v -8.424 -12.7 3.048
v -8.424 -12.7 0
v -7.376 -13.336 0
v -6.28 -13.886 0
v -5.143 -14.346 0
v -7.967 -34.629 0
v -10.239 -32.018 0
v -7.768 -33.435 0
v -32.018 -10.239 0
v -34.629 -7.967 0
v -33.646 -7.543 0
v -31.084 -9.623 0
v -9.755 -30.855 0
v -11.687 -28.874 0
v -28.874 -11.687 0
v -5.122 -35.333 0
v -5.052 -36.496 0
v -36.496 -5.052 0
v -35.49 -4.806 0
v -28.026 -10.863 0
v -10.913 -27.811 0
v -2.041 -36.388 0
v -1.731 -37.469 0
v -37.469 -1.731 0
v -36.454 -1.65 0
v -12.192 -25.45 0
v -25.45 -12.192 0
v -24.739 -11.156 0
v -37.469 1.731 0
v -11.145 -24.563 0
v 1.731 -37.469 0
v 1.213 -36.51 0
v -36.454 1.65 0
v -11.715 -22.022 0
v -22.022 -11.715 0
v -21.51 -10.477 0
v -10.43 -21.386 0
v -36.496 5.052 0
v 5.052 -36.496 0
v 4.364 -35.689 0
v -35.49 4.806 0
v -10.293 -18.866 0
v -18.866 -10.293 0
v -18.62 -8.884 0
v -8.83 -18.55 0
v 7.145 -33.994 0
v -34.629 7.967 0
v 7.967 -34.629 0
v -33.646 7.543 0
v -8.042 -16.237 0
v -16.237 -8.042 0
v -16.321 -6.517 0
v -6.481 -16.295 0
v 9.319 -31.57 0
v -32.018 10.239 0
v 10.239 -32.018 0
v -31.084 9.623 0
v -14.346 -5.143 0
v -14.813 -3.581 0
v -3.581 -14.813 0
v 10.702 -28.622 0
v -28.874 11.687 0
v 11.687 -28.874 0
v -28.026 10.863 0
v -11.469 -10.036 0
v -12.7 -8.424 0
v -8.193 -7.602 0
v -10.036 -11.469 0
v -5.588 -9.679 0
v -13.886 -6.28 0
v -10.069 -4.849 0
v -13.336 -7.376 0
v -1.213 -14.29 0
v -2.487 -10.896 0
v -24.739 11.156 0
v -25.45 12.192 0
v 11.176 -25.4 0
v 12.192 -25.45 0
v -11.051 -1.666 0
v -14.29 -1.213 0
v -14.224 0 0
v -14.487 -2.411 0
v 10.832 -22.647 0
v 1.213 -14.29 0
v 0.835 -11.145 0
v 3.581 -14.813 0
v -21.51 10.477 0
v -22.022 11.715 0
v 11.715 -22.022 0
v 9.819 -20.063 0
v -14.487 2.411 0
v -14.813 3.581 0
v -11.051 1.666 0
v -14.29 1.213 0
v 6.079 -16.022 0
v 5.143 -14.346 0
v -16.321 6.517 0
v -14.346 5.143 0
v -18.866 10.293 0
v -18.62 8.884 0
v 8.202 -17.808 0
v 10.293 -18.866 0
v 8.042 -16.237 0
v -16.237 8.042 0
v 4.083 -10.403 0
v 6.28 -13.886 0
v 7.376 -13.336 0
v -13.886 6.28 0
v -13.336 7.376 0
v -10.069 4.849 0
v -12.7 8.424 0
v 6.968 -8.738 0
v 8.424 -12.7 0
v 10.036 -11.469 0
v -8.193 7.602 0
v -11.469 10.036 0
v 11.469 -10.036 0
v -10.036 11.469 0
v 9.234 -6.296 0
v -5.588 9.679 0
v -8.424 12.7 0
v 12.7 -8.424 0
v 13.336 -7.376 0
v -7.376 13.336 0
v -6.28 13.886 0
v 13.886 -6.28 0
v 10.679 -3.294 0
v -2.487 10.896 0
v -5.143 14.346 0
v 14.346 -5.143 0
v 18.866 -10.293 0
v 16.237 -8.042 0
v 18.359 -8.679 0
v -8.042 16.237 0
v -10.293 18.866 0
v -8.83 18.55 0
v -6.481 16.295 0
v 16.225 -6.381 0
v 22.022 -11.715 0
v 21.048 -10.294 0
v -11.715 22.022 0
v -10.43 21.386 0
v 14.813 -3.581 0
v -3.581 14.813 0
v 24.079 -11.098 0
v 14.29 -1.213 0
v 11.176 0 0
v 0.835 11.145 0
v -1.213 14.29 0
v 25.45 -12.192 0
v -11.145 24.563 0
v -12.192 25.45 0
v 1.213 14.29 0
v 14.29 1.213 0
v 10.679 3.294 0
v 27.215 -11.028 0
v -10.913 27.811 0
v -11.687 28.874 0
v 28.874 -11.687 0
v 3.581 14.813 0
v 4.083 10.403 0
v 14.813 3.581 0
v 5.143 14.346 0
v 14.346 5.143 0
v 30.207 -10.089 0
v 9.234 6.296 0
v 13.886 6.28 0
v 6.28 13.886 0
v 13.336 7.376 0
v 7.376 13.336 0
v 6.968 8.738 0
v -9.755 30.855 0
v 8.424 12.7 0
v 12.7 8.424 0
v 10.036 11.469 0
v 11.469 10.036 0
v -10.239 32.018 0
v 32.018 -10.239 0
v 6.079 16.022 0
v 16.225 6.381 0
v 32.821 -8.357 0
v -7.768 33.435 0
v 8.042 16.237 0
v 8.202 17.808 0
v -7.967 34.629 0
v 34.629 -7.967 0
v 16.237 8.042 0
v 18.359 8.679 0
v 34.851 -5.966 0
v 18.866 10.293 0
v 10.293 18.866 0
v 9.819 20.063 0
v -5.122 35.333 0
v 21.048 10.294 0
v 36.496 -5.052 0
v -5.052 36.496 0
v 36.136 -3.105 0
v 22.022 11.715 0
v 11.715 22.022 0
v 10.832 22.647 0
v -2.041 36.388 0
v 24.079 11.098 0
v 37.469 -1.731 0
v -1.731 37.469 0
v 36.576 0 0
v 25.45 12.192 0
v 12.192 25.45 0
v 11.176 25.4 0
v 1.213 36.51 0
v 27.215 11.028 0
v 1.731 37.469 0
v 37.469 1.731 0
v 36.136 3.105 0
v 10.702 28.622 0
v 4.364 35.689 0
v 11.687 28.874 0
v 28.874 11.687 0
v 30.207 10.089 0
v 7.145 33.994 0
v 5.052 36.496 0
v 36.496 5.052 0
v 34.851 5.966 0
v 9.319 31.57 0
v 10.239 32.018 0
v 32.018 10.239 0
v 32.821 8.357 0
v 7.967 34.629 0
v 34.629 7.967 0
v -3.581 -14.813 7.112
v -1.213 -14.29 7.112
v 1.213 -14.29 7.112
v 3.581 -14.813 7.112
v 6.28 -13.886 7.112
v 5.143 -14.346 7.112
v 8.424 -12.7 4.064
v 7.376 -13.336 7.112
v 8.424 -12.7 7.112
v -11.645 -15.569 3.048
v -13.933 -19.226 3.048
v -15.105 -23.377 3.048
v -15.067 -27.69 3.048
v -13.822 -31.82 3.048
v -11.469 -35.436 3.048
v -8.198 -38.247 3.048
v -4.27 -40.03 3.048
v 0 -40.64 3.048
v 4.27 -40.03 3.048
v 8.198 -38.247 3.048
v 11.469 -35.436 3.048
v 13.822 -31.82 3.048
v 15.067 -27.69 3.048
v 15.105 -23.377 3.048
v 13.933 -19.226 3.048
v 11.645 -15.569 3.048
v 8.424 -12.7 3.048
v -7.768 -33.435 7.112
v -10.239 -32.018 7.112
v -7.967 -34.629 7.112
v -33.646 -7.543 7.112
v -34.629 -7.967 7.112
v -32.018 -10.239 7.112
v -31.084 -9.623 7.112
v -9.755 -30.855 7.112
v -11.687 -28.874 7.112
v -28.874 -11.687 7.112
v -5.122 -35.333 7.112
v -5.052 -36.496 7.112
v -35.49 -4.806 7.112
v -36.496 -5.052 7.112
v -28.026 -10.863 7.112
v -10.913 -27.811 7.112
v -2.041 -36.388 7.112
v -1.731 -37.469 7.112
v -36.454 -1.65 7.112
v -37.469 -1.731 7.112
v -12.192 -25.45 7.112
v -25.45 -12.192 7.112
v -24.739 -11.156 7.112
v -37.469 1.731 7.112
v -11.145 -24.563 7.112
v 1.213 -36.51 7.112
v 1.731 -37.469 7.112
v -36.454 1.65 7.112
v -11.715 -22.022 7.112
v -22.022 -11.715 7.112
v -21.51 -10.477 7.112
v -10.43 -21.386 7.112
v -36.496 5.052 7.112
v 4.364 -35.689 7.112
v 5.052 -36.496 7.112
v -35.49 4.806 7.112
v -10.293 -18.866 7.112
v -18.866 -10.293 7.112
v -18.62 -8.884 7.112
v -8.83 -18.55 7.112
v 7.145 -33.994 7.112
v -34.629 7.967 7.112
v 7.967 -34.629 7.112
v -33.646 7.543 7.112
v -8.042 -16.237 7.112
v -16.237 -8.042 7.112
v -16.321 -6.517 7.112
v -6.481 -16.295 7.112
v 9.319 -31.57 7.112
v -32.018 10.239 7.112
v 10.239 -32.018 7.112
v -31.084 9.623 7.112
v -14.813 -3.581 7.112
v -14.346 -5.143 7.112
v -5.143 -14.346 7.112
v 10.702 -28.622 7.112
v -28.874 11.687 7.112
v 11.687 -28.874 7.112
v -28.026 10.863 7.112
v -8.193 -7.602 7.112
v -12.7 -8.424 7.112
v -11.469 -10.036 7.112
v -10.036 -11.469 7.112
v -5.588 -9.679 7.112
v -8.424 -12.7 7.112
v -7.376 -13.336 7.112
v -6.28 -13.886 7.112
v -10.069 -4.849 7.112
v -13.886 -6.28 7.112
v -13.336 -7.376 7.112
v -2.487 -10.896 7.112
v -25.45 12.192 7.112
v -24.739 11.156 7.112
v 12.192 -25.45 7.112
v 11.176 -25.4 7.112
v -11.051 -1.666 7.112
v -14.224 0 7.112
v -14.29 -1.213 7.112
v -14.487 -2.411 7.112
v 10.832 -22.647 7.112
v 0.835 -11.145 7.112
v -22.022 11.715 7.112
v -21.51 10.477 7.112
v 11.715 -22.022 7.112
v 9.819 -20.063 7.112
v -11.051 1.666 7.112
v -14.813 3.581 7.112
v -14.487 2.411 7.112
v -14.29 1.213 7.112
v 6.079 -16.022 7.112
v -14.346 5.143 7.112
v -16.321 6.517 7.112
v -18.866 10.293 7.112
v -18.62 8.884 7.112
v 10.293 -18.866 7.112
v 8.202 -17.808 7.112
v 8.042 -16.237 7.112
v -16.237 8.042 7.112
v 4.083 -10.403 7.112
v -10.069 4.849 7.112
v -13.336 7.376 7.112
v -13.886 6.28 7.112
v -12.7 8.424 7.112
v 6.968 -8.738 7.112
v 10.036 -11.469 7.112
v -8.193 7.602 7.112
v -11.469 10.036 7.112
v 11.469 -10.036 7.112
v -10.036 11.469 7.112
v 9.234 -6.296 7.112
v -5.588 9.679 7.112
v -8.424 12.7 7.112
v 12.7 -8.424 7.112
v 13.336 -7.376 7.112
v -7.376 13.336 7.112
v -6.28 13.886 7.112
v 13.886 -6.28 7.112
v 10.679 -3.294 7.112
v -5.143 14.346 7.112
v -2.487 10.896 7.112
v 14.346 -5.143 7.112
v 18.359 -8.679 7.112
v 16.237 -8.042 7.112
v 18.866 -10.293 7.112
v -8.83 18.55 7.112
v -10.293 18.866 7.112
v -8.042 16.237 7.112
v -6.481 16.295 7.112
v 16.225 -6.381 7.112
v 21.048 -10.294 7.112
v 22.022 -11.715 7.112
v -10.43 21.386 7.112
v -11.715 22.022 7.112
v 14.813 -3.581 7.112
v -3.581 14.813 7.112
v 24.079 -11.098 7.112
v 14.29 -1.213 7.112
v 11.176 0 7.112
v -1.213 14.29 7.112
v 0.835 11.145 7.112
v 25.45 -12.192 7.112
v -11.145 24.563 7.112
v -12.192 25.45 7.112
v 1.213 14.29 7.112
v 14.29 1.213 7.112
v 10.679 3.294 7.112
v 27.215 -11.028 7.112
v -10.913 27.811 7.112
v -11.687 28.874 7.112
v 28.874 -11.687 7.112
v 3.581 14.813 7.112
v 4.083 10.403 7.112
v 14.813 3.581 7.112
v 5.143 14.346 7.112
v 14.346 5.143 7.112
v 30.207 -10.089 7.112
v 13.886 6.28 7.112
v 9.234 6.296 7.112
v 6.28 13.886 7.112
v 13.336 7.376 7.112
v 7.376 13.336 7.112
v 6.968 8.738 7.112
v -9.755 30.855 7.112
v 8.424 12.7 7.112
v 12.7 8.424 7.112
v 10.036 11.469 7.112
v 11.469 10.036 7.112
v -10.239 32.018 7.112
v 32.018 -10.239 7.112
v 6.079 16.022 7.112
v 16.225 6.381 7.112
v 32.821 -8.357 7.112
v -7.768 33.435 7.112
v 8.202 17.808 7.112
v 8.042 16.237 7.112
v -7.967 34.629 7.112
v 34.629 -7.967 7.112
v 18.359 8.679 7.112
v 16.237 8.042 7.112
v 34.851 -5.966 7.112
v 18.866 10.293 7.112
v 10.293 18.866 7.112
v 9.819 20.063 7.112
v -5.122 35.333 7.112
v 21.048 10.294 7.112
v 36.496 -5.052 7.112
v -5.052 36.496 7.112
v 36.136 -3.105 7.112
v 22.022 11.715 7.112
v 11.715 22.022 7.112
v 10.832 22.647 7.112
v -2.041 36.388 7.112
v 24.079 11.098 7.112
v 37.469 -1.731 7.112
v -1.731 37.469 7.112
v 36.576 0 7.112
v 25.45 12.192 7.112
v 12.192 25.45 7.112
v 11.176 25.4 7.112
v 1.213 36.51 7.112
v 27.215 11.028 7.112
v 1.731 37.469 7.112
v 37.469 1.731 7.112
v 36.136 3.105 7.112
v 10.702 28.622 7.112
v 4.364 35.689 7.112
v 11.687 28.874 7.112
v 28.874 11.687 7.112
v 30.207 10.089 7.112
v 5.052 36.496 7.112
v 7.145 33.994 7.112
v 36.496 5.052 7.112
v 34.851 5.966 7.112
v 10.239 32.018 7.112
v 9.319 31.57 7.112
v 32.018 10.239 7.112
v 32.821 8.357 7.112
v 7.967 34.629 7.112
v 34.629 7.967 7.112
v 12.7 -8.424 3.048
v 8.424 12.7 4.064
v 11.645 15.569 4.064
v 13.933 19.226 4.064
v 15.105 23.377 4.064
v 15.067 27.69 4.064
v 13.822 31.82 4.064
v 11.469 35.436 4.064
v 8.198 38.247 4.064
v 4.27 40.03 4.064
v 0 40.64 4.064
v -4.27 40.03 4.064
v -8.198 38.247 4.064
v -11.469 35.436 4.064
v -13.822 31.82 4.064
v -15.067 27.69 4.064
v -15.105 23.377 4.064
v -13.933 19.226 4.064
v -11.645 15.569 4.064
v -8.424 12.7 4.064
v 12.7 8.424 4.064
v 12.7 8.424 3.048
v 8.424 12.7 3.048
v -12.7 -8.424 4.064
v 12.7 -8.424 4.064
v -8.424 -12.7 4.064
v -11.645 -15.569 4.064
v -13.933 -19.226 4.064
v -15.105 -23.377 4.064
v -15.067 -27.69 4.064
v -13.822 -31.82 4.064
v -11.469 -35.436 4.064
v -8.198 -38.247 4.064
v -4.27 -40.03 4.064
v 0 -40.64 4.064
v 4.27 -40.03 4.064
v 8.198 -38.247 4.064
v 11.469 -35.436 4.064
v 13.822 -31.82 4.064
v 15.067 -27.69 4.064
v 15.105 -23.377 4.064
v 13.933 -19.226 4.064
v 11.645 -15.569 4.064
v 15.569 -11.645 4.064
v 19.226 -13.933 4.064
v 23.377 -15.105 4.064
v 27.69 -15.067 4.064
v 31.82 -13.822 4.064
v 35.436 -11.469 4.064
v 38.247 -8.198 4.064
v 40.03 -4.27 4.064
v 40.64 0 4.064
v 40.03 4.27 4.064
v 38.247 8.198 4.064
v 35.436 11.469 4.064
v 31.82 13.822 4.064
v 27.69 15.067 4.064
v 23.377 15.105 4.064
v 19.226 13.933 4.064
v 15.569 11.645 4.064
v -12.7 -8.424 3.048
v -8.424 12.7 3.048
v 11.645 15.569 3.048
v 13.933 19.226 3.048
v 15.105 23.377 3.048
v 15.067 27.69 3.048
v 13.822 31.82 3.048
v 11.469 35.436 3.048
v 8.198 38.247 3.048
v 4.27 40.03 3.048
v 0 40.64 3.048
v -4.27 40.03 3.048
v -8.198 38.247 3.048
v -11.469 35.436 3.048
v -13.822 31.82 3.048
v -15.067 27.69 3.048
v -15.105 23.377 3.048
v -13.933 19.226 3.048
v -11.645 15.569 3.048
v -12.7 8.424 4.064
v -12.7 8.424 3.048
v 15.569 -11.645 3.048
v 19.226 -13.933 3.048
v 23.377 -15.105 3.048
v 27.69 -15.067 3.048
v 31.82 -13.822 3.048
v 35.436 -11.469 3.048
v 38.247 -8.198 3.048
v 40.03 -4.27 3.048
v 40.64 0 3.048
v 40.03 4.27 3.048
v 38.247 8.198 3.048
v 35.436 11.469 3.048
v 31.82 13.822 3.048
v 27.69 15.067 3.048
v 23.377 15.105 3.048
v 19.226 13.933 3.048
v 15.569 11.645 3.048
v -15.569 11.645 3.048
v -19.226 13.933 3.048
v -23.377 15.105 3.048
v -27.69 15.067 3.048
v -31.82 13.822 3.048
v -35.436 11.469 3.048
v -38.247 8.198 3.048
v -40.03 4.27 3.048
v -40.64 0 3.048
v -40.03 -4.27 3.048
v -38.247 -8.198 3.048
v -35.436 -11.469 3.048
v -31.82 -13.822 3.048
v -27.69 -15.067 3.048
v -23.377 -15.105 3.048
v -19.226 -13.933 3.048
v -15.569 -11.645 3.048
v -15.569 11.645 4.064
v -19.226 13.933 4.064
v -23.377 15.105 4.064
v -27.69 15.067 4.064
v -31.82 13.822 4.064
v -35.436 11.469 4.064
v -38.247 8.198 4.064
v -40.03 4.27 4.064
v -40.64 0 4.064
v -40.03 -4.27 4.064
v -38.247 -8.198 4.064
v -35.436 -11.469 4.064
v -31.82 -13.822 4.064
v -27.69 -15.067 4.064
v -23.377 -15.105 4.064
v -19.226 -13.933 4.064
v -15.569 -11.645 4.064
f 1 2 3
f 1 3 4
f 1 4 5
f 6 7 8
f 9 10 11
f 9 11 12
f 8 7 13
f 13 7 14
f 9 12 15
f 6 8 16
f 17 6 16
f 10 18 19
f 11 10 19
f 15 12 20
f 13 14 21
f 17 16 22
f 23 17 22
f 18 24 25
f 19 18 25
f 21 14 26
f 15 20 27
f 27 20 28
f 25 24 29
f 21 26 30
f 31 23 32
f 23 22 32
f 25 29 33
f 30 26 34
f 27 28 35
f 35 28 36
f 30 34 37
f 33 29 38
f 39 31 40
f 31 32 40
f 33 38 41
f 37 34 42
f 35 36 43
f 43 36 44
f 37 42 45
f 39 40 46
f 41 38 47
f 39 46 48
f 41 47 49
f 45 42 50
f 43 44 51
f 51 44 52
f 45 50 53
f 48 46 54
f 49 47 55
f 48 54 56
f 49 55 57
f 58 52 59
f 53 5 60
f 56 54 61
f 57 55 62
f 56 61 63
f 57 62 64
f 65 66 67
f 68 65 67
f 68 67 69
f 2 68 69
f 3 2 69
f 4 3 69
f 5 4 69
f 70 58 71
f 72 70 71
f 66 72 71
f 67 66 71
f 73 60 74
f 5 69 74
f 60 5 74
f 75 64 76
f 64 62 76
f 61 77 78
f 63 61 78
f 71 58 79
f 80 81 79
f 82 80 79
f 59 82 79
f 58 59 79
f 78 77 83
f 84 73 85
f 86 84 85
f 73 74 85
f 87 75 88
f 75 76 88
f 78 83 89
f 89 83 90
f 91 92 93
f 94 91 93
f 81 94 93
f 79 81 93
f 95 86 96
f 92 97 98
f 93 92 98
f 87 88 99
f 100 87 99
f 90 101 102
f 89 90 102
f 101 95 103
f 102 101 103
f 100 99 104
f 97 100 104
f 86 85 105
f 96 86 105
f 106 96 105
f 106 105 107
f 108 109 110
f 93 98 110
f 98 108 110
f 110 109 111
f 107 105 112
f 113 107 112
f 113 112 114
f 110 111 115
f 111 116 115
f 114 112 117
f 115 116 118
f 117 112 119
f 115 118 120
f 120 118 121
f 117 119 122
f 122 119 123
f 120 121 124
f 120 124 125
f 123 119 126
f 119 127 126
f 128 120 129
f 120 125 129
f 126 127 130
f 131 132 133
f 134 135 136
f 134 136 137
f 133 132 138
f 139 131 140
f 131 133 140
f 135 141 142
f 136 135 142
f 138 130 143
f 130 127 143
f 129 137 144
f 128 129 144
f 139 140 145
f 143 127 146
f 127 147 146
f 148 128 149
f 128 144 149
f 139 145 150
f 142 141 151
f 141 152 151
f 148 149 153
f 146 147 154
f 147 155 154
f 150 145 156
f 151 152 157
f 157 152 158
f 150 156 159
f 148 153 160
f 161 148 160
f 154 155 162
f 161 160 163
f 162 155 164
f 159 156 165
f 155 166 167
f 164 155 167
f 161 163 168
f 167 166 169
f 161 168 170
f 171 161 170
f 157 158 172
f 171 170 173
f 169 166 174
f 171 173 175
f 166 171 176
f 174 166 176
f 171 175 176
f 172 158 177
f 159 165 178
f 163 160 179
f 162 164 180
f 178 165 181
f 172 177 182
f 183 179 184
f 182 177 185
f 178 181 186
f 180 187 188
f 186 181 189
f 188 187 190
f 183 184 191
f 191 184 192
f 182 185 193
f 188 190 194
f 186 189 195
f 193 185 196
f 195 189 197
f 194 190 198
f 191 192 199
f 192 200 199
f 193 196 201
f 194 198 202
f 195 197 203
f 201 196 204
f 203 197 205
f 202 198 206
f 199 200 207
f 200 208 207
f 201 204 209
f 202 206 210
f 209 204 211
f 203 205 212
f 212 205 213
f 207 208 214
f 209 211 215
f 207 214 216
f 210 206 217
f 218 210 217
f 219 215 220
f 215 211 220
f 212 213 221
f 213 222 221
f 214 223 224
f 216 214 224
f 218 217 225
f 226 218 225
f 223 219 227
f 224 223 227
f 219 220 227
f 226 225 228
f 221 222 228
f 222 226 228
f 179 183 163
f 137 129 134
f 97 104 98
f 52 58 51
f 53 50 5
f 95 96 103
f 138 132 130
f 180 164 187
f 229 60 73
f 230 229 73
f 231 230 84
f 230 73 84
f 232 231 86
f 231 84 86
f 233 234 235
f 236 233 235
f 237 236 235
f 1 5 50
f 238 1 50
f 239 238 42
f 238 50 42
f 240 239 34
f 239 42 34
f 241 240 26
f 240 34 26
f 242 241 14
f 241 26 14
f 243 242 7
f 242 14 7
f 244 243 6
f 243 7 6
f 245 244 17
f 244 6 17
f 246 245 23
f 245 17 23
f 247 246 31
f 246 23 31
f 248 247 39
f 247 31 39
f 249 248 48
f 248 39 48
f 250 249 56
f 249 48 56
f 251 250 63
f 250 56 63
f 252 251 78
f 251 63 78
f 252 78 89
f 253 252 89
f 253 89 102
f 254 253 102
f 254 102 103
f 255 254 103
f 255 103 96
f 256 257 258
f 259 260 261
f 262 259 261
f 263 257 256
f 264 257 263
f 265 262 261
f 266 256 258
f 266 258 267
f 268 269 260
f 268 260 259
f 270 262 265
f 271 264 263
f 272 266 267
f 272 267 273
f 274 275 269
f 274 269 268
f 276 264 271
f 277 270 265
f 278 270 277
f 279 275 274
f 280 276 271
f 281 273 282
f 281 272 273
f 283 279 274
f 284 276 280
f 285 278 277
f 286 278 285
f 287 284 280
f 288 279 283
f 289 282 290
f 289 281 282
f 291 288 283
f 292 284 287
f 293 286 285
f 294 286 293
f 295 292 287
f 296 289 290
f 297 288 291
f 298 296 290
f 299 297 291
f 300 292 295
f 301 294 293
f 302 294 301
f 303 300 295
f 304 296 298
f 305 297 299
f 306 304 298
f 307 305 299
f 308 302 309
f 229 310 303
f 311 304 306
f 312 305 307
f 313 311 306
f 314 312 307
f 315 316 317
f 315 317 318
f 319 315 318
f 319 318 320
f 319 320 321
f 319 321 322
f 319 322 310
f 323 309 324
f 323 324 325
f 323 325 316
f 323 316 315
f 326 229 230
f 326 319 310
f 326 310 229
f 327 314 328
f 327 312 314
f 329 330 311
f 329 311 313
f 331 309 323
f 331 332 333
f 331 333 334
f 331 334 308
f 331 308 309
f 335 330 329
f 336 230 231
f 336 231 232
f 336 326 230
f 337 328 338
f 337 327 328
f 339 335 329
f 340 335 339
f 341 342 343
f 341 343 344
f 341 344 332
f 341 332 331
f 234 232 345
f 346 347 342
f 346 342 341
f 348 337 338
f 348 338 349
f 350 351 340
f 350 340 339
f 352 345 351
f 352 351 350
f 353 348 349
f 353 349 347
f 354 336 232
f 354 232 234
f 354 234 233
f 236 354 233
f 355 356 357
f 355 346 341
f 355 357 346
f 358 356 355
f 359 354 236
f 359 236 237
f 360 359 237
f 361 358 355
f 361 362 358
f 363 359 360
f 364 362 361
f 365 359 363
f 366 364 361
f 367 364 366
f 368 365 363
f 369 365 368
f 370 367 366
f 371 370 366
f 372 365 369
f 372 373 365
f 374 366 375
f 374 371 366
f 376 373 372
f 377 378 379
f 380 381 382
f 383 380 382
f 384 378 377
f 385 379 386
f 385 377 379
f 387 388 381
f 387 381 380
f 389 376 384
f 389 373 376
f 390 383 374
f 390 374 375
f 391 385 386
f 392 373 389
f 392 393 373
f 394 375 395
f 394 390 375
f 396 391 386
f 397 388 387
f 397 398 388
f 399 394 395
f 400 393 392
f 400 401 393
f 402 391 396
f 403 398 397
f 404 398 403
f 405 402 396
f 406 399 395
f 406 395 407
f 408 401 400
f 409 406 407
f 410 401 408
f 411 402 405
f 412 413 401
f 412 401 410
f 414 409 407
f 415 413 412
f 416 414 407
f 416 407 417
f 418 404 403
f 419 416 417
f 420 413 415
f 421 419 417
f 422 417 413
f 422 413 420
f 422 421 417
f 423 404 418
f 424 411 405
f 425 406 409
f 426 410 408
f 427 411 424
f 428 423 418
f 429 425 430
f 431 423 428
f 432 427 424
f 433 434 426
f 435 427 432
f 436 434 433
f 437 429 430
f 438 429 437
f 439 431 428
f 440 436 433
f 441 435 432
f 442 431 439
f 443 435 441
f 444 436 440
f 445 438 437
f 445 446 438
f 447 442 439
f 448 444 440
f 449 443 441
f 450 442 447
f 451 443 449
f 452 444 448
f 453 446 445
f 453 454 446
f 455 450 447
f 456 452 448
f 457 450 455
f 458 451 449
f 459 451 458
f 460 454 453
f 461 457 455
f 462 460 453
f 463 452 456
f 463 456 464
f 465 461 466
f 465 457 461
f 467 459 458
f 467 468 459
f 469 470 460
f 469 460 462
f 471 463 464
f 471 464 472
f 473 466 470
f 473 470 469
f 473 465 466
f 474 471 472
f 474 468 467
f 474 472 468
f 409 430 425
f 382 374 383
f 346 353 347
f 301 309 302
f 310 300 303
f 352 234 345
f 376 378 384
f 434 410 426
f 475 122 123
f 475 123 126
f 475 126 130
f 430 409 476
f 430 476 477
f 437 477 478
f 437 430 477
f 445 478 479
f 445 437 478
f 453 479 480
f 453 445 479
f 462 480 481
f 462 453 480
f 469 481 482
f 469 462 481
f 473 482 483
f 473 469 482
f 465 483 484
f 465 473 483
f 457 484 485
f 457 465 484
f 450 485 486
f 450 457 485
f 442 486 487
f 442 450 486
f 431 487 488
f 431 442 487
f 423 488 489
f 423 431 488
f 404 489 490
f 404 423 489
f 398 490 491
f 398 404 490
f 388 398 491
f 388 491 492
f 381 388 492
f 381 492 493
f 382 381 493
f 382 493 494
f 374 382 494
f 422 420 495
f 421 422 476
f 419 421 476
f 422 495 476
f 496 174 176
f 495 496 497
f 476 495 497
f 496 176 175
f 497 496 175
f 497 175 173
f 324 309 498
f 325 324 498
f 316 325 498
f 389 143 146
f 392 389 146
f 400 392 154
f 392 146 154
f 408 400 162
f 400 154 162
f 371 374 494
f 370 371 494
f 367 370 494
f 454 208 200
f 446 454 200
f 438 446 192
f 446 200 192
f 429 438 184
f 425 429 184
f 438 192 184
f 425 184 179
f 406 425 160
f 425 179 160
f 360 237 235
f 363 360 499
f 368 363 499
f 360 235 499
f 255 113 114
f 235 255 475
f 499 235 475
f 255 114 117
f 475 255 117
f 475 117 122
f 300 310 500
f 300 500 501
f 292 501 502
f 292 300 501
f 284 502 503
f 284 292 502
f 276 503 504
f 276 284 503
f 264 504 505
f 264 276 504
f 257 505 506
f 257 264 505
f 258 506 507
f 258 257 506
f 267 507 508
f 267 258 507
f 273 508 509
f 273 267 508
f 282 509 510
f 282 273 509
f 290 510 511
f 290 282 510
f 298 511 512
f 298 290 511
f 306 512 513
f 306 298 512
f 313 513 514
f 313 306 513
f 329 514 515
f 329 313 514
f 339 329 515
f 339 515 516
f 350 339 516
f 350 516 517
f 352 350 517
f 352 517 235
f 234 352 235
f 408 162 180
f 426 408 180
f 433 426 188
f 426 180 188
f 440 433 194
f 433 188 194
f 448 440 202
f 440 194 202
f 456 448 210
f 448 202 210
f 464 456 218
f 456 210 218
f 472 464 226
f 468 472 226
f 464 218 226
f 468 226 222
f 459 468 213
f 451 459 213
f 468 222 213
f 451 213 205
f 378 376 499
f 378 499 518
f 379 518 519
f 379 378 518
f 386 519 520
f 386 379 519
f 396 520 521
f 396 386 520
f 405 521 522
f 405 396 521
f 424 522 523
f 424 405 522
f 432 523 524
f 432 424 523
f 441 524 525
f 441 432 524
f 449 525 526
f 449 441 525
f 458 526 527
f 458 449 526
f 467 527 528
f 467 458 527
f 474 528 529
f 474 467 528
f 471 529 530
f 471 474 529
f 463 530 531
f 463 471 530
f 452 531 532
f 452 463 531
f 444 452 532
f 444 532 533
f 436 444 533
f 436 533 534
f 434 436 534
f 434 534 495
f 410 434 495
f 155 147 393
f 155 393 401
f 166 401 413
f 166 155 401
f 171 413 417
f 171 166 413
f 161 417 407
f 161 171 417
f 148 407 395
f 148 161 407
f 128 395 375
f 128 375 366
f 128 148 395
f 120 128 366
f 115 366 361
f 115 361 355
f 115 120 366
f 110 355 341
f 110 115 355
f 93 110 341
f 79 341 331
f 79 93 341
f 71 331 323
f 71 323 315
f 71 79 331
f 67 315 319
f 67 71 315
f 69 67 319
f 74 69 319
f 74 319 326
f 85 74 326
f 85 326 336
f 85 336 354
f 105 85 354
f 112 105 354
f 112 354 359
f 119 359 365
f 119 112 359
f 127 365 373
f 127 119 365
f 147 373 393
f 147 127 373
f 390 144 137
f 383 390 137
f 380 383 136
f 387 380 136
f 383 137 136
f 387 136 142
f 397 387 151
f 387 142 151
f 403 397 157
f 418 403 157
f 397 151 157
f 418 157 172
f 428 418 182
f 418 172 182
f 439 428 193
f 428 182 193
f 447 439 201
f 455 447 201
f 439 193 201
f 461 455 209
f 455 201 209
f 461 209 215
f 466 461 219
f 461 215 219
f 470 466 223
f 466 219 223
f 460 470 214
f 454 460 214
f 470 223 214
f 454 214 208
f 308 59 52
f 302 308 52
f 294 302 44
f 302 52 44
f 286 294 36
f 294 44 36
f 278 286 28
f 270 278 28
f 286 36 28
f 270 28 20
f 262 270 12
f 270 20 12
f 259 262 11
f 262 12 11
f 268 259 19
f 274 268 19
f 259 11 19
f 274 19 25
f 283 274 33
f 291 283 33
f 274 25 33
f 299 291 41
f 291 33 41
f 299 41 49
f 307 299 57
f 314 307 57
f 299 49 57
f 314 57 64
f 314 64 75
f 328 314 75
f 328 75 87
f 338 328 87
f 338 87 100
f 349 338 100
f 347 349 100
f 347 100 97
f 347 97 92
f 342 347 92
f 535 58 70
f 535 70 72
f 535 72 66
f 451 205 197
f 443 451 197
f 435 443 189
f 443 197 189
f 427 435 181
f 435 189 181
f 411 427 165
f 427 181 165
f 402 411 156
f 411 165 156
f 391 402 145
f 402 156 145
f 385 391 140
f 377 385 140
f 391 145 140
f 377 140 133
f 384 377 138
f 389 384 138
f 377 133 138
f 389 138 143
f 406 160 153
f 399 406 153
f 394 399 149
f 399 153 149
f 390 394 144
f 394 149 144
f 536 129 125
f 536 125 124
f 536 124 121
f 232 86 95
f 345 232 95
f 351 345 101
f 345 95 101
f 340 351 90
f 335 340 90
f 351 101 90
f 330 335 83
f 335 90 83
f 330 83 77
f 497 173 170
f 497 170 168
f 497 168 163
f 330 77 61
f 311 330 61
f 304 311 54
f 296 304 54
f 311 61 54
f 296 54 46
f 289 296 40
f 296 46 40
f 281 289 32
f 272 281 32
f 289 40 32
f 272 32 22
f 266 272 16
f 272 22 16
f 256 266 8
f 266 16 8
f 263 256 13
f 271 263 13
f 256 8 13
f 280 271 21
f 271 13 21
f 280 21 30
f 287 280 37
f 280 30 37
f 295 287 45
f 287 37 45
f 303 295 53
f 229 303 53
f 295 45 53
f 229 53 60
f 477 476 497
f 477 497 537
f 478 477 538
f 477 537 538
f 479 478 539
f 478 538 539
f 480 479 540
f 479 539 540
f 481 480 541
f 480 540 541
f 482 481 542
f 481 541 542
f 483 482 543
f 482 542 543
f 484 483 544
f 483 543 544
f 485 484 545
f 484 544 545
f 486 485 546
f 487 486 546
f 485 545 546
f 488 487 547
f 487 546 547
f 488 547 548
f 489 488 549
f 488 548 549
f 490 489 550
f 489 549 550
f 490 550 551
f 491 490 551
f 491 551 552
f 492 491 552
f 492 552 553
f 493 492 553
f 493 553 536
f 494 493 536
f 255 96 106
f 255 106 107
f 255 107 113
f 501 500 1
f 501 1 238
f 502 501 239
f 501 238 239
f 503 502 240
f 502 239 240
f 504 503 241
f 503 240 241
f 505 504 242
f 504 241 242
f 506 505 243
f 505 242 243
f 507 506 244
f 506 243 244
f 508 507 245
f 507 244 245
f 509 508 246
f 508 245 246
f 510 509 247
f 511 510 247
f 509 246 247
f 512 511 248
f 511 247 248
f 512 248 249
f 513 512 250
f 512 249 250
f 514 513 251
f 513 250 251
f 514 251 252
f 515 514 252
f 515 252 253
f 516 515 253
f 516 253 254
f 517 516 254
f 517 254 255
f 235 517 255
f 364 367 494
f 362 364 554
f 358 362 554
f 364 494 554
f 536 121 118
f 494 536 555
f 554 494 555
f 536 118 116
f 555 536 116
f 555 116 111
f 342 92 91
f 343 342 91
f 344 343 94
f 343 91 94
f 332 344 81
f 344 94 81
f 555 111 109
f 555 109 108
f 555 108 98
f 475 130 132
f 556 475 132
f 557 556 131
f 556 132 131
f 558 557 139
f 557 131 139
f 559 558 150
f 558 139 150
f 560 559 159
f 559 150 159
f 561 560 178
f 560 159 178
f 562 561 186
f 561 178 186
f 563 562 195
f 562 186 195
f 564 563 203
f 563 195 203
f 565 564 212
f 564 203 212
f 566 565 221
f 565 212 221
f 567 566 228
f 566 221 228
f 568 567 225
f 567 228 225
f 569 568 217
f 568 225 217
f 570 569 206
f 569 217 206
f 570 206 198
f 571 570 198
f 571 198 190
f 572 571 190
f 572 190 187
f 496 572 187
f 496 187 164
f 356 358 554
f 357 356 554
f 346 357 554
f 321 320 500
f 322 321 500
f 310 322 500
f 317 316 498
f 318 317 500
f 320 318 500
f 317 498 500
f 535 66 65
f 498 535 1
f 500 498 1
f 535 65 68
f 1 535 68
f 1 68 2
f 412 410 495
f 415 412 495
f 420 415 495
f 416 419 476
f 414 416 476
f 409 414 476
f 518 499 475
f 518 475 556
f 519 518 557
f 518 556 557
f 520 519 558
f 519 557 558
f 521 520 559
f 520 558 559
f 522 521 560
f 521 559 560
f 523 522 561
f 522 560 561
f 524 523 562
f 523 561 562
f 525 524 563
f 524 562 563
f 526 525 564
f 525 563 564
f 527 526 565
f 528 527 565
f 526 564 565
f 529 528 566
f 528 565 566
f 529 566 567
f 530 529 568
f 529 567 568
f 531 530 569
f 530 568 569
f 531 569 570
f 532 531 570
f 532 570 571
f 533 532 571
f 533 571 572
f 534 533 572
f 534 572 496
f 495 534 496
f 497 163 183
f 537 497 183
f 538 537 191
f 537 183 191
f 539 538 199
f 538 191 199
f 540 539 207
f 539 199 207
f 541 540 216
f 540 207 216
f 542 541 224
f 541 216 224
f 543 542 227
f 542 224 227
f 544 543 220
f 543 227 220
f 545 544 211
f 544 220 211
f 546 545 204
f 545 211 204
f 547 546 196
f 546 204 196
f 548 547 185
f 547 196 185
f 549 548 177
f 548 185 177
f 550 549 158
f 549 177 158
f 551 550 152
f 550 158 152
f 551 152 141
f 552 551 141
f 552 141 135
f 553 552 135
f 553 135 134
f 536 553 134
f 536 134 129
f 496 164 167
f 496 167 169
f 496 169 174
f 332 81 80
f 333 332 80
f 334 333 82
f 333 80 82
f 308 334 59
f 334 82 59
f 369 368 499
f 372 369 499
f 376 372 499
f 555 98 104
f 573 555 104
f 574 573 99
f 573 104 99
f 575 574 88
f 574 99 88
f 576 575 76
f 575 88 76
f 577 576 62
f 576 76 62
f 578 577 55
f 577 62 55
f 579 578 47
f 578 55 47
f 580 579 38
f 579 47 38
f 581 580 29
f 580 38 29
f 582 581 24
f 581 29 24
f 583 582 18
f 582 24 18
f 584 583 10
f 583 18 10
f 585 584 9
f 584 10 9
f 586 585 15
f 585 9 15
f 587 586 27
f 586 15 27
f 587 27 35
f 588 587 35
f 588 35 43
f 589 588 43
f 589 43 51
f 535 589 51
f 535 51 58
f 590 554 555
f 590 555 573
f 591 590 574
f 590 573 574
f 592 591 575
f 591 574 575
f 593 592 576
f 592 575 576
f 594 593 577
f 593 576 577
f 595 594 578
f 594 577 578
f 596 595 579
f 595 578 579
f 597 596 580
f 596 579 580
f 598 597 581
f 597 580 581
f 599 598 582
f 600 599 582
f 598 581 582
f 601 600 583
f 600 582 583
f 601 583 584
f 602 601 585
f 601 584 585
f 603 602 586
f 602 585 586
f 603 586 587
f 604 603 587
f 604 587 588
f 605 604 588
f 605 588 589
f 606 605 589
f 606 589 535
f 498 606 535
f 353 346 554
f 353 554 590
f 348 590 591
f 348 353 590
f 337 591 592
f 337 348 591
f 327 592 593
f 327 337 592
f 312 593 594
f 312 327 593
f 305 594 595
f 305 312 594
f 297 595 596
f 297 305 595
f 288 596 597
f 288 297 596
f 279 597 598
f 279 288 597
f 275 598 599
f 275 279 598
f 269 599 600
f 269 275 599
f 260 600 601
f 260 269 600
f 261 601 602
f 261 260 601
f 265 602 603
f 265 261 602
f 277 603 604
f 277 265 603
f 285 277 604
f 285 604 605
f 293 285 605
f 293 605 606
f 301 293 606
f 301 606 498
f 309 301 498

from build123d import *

# Parameters (mm, degrees)
F0_R         = 11.176
F1_DEPTH     = 7.112
F2_T4_ANGLE  = 352.0754293858
F2_S5_R      = 15.24
F2_T6_DEPTH  = 23
F2_T10_ANGLE = 352.0754293858
F2_S11_R     = 15.24
F2_T12_DEPTH = 23
F2_T16_ANGLE = 352.0754293858
F2_S17_R     = 15.24
F2_T18_DEPTH = 23
F2_T22_ANGLE = 352.0754293858
F2_S23_R     = 15.24
F2_T24_DEPTH = 23
F2_T28_ANGLE = 352.0754293858
F2_S29_R     = 15.24
F2_T30_DEPTH = 23
F2_T34_ANGLE = 352.0754293858
F2_S35_R     = 15.24
F2_T36_DEPTH = 23
F2_T40_ANGLE = 352.0754293858
F2_S41_R     = 15.24
F2_T42_DEPTH = 23
F2_T46_ANGLE = 352.0754293858
F2_S47_R     = 15.24
F2_T48_DEPTH = 23


# Not quite as in the source:
# - a fillet or chamfer that OpenCascade refuses, or shapes differently, is made with other operations: its cross-section is extruded or revolved along the edge and cut away or added


with BuildPart() as f1:
    # F0 (on Top) → F1 (new body)
    with BuildSketch(Plane.XY):
        with BuildLine():
            ThreePointArc((-14.224, 0), (-14.3723039868, -1.8146340237), (-14.81328, -3.5811081583))
            ThreePointArc((-14.81328, -3.5811081583), (-13.9681456908, -6.0949574207), (-12.7, -8.4242269675))
            ThreePointArc((-12.7, -8.4242269675), (-10.7763073453, -10.7763073453), (-8.4242269675, -12.7))
            ThreePointArc((-8.4242269675, -12.7), (-6.0949574207, -13.9681456908), (-3.5811081583, -14.81328))
            ThreePointArc((-3.5811081583, -14.81328), (0, -14.224), (3.5811081583, -14.81328))
            ThreePointArc((3.5811081583, -14.81328), (6.0949574207, -13.9681456908), (8.4242269675, -12.7))
            ThreePointArc((8.4242269675, -12.7), (10.7763073453, -10.7763073453), (12.7, -8.4242269675))
            ThreePointArc((12.7, -8.4242269675), (13.9681456908, -6.0949574207), (14.81328, -3.5811081583))
            ThreePointArc((14.81328, -3.5811081583), (14.224, 0), (14.81328, 3.5811081583))
            ThreePointArc((14.81328, 3.5811081583), (13.9681456908, 6.0949574207), (12.7, 8.4242269675))
            ThreePointArc((12.7, 8.4242269675), (10.7763073453, 10.7763073453), (8.4242269675, 12.7))
            ThreePointArc((8.4242269675, 12.7), (6.0949574207, 13.9681456908), (3.5811081583, 14.81328))
            ThreePointArc((3.5811081583, 14.81328), (0, 14.224), (-3.5811081583, 14.81328))
            ThreePointArc((-3.5811081583, 14.81328), (-6.0949574207, 13.9681456908), (-8.4242269675, 12.7))
            ThreePointArc((-8.4242269675, 12.7), (-10.7763073453, 10.7763073453), (-12.7, 8.4242269675))
            ThreePointArc((-12.7, 8.4242269675), (-13.9681456908, 6.0949574207), (-14.81328, 3.5811081583))
            ThreePointArc((-14.81328, 3.5811081583), (-14.3723039868, 1.8146340237), (-14.224, 0))
        make_face()
        Circle(F0_R, mode=Mode.SUBTRACT)
        with BuildLine():
            ThreePointArc((-12.7, -8.4242269675), (-13.9681456908, -6.0949574207), (-14.81328, -3.5811081583))
            ThreePointArc((-14.81328, -3.5811081583), (-36.576, 0), (-14.81328, 3.5811081583))
            ThreePointArc((-14.81328, 3.5811081583), (-13.9681456908, 6.0949574207), (-12.7, 8.4242269675))
            ThreePointArc((-12.7, 8.4242269675), (-40.64, 0), (-12.7, -8.4242269675))
        make_face()
        with BuildLine():
            ThreePointArc((-3.5811081583, -14.81328), (-6.0949574207, -13.9681456908), (-8.4242269675, -12.7))
            ThreePointArc((-8.4242269675, -12.7), (0, -40.64), (8.4242269675, -12.7))
            ThreePointArc((8.4242269675, -12.7), (6.0949574207, -13.9681456908), (3.5811081583, -14.81328))
            ThreePointArc((3.5811081583, -14.81328), (9.0808986553, -18.8853813917), (11.176, -25.4))
            ThreePointArc((11.176, -25.4), (-6.5146186083, -34.4808986553), (-3.5811081583, -14.81328))
        make_face()
        with BuildLine():
            ThreePointArc((8.4242269675, 12.7), (0, 40.64), (-8.4242269675, 12.7))
            ThreePointArc((-8.4242269675, 12.7), (-6.0949574207, 13.9681456908), (-3.5811081583, 14.81328))
            ThreePointArc((-3.5811081583, 14.81328), (-6.5146186083, 34.4808986553), (11.176, 25.4))
            ThreePointArc((11.176, 25.4), (9.0808986553, 18.8853813917), (3.5811081583, 14.81328))
            ThreePointArc((3.5811081583, 14.81328), (6.0949574207, 13.9681456908), (8.4242269675, 12.7))
        make_face()
        with BuildLine():
            ThreePointArc((14.81328, -3.5811081583), (13.9681456908, -6.0949574207), (12.7, -8.4242269675))
            ThreePointArc((12.7, -8.4242269675), (40.64, 0), (12.7, 8.4242269675))
            ThreePointArc((12.7, 8.4242269675), (13.9681456908, 6.0949574207), (14.81328, 3.5811081583))
            ThreePointArc((14.81328, 3.5811081583), (27.2146340237, 11.0276960132), (36.576, 0))
            ThreePointArc((36.576, 0), (27.2146340237, -11.0276960132), (14.81328, -3.5811081583))
        make_face()
    extrude(amount=F1_DEPTH)

    # F2: chamfer of 3.048 on 8 edges, made by hand


with BuildPart() as f2_tool2:
    # F2_s3 → F2_t4 (revolve)
    with BuildSketch(Plane(origin=(1.7509401303, 0.1212795301, 0), x_dir=(0, 0, 1), z_dir=(-0.997609751, -0.0690998166, 0))):
        Polygon((4.064, 10.0992876762), (7.112, 13.1472876762), (7.112, 10.0992876762), align=None)
    revolve(axis=Axis((0, 25.4, 7.112), (0, 0, 1)), revolution_arc=F2_T4_ANGLE)

    # F2_s5 → F2_t6 (cut, symmetric)
    with BuildSketch(Plane.XY.offset(5.6)):
        Circle(F2_S5_R)
    extrude(amount=F2_T6_DEPTH, both=True, mode=Mode.SUBTRACT)


with BuildPart() as f1_1:
    add(f1.part)

    # F2_t1: cut F2_tool2
    add(f2_tool2.part, mode=Mode.SUBTRACT)


with BuildPart() as f2_tool8:
    # F2_s9 → F2_t10 (revolve)
    with BuildSketch(Plane(origin=(1.7509401303, 0.1212795301, 0), x_dir=(0, 0, 1), z_dir=(-0.997609751, -0.0690998166, 0))):
        Polygon((3.048, 10.0992876762), (0, 13.1472876762), (0, 10.0992876762), align=None)
    revolve(axis=Axis((0, 25.4, 0), (0, 0, 1)), revolution_arc=F2_T10_ANGLE)

    # F2_s11 → F2_t12 (cut, symmetric)
    with BuildSketch(Plane.XY.offset(1.5)):
        Circle(F2_S11_R)
    extrude(amount=F2_T12_DEPTH, both=True, mode=Mode.SUBTRACT)


with BuildPart() as f1_2:
    add(f1_1.part)

    # F2_t7: cut F2_tool8
    add(f2_tool8.part, mode=Mode.SUBTRACT)


with BuildPart() as f2_tool14:
    # F2_s15 → F2_t16 (revolve)
    with BuildSketch(Plane(origin=(0.1212795301, -1.7509401303, 0), x_dir=(0, 0, 1), z_dir=(-0.0690998166, 0.997609751, 0))):
        Polygon((4.064, 10.0992876762), (7.112, 13.1472876762), (7.112, 10.0992876762), align=None)
    revolve(axis=Axis((25.4, 0, 7.112), (0, 0, 1)), revolution_arc=F2_T16_ANGLE)

    # F2_s17 → F2_t18 (cut, symmetric)
    with BuildSketch(Plane.XY.offset(5.6)):
        Circle(F2_S17_R)
    extrude(amount=F2_T18_DEPTH, both=True, mode=Mode.SUBTRACT)


with BuildPart() as f1_3:
    add(f1_2.part)

    # F2_t13: cut F2_tool14
    add(f2_tool14.part, mode=Mode.SUBTRACT)


with BuildPart() as f2_tool20:
    # F2_s21 → F2_t22 (revolve)
    with BuildSketch(Plane(origin=(0.1212795301, -1.7509401303, 0), x_dir=(0, 0, 1), z_dir=(-0.0690998166, 0.997609751, 0))):
        Polygon((3.048, 10.0992876762), (0, 13.1472876762), (0, 10.0992876762), align=None)
    revolve(axis=Axis((25.4, 0, 0), (0, 0, 1)), revolution_arc=F2_T22_ANGLE)

    # F2_s23 → F2_t24 (cut, symmetric)
    with BuildSketch(Plane.XY.offset(1.5)):
        Circle(F2_S23_R)
    extrude(amount=F2_T24_DEPTH, both=True, mode=Mode.SUBTRACT)


with BuildPart() as f1_4:
    add(f1_3.part)

    # F2_t19: cut F2_tool20
    add(f2_tool20.part, mode=Mode.SUBTRACT)


with BuildPart() as f2_tool26:
    # F2_s27 → F2_t28 (revolve)
    with BuildSketch(Plane(origin=(-1.7509401303, -0.1212795301, 0), x_dir=(0, 0, 1), z_dir=(0.997609751, 0.0690998166, 0))):
        Polygon((4.064, 10.0992876762), (7.112, 13.1472876762), (7.112, 10.0992876762), align=None)
    revolve(axis=Axis((0, -25.4, 7.112), (0, 0, 1)), revolution_arc=F2_T28_ANGLE)

    # F2_s29 → F2_t30 (cut, symmetric)
    with BuildSketch(Plane.XY.offset(5.6)):
        Circle(F2_S29_R)
    extrude(amount=F2_T30_DEPTH, both=True, mode=Mode.SUBTRACT)


with BuildPart() as f1_5:
    add(f1_4.part)

    # F2_t25: cut F2_tool26
    add(f2_tool26.part, mode=Mode.SUBTRACT)


with BuildPart() as f2_tool32:
    # F2_s33 → F2_t34 (revolve)
    with BuildSketch(Plane(origin=(-1.7509401303, -0.1212795301, 0), x_dir=(0, 0, 1), z_dir=(0.997609751, 0.0690998166, 0))):
        Polygon((3.048, 10.0992876762), (0, 13.1472876762), (0, 10.0992876762), align=None)
    revolve(axis=Axis((0, -25.4, 0), (0, 0, 1)), revolution_arc=F2_T34_ANGLE)

    # F2_s35 → F2_t36 (cut, symmetric)
    with BuildSketch(Plane.XY.offset(1.5)):
        Circle(F2_S35_R)
    extrude(amount=F2_T36_DEPTH, both=True, mode=Mode.SUBTRACT)


with BuildPart() as f1_6:
    add(f1_5.part)

    # F2_t31: cut F2_tool32
    add(f2_tool32.part, mode=Mode.SUBTRACT)


with BuildPart() as f2_tool38:
    # F2_s39 → F2_t40 (revolve)
    with BuildSketch(Plane(origin=(-0.1212795301, 1.7509401303, 0), x_dir=(0, 0, 1), z_dir=(0.0690998166, -0.997609751, 0))):
        Polygon((4.064, 10.0992876762), (7.112, 13.1472876762), (7.112, 10.0992876762), align=None)
    revolve(axis=Axis((-25.4, 0, 7.112), (0, 0, 1)), revolution_arc=F2_T40_ANGLE)

    # F2_s41 → F2_t42 (cut, symmetric)
    with BuildSketch(Plane.XY.offset(5.6)):
        Circle(F2_S41_R)
    extrude(amount=F2_T42_DEPTH, both=True, mode=Mode.SUBTRACT)


with BuildPart() as f1_7:
    add(f1_6.part)

    # F2_t37: cut F2_tool38
    add(f2_tool38.part, mode=Mode.SUBTRACT)


with BuildPart() as f2_tool44:
    # F2_s45 → F2_t46 (revolve)
    with BuildSketch(Plane(origin=(-0.1212795301, 1.7509401303, 0), x_dir=(0, 0, 1), z_dir=(0.0690998166, -0.997609751, 0))):
        Polygon((3.048, 10.0992876762), (0, 13.1472876762), (0, 10.0992876762), align=None)
    revolve(axis=Axis((-25.4, 0, 0), (0, 0, 1)), revolution_arc=F2_T46_ANGLE)

    # F2_s47 → F2_t48 (cut, symmetric)
    with BuildSketch(Plane.XY.offset(1.5)):
        Circle(F2_S47_R)
    extrude(amount=F2_T48_DEPTH, both=True, mode=Mode.SUBTRACT)


with BuildPart() as f1_8:
    add(f1_7.part)

    # F2_t43: cut F2_tool44
    add(f2_tool44.part, mode=Mode.SUBTRACT)


solid = f1_8.part
